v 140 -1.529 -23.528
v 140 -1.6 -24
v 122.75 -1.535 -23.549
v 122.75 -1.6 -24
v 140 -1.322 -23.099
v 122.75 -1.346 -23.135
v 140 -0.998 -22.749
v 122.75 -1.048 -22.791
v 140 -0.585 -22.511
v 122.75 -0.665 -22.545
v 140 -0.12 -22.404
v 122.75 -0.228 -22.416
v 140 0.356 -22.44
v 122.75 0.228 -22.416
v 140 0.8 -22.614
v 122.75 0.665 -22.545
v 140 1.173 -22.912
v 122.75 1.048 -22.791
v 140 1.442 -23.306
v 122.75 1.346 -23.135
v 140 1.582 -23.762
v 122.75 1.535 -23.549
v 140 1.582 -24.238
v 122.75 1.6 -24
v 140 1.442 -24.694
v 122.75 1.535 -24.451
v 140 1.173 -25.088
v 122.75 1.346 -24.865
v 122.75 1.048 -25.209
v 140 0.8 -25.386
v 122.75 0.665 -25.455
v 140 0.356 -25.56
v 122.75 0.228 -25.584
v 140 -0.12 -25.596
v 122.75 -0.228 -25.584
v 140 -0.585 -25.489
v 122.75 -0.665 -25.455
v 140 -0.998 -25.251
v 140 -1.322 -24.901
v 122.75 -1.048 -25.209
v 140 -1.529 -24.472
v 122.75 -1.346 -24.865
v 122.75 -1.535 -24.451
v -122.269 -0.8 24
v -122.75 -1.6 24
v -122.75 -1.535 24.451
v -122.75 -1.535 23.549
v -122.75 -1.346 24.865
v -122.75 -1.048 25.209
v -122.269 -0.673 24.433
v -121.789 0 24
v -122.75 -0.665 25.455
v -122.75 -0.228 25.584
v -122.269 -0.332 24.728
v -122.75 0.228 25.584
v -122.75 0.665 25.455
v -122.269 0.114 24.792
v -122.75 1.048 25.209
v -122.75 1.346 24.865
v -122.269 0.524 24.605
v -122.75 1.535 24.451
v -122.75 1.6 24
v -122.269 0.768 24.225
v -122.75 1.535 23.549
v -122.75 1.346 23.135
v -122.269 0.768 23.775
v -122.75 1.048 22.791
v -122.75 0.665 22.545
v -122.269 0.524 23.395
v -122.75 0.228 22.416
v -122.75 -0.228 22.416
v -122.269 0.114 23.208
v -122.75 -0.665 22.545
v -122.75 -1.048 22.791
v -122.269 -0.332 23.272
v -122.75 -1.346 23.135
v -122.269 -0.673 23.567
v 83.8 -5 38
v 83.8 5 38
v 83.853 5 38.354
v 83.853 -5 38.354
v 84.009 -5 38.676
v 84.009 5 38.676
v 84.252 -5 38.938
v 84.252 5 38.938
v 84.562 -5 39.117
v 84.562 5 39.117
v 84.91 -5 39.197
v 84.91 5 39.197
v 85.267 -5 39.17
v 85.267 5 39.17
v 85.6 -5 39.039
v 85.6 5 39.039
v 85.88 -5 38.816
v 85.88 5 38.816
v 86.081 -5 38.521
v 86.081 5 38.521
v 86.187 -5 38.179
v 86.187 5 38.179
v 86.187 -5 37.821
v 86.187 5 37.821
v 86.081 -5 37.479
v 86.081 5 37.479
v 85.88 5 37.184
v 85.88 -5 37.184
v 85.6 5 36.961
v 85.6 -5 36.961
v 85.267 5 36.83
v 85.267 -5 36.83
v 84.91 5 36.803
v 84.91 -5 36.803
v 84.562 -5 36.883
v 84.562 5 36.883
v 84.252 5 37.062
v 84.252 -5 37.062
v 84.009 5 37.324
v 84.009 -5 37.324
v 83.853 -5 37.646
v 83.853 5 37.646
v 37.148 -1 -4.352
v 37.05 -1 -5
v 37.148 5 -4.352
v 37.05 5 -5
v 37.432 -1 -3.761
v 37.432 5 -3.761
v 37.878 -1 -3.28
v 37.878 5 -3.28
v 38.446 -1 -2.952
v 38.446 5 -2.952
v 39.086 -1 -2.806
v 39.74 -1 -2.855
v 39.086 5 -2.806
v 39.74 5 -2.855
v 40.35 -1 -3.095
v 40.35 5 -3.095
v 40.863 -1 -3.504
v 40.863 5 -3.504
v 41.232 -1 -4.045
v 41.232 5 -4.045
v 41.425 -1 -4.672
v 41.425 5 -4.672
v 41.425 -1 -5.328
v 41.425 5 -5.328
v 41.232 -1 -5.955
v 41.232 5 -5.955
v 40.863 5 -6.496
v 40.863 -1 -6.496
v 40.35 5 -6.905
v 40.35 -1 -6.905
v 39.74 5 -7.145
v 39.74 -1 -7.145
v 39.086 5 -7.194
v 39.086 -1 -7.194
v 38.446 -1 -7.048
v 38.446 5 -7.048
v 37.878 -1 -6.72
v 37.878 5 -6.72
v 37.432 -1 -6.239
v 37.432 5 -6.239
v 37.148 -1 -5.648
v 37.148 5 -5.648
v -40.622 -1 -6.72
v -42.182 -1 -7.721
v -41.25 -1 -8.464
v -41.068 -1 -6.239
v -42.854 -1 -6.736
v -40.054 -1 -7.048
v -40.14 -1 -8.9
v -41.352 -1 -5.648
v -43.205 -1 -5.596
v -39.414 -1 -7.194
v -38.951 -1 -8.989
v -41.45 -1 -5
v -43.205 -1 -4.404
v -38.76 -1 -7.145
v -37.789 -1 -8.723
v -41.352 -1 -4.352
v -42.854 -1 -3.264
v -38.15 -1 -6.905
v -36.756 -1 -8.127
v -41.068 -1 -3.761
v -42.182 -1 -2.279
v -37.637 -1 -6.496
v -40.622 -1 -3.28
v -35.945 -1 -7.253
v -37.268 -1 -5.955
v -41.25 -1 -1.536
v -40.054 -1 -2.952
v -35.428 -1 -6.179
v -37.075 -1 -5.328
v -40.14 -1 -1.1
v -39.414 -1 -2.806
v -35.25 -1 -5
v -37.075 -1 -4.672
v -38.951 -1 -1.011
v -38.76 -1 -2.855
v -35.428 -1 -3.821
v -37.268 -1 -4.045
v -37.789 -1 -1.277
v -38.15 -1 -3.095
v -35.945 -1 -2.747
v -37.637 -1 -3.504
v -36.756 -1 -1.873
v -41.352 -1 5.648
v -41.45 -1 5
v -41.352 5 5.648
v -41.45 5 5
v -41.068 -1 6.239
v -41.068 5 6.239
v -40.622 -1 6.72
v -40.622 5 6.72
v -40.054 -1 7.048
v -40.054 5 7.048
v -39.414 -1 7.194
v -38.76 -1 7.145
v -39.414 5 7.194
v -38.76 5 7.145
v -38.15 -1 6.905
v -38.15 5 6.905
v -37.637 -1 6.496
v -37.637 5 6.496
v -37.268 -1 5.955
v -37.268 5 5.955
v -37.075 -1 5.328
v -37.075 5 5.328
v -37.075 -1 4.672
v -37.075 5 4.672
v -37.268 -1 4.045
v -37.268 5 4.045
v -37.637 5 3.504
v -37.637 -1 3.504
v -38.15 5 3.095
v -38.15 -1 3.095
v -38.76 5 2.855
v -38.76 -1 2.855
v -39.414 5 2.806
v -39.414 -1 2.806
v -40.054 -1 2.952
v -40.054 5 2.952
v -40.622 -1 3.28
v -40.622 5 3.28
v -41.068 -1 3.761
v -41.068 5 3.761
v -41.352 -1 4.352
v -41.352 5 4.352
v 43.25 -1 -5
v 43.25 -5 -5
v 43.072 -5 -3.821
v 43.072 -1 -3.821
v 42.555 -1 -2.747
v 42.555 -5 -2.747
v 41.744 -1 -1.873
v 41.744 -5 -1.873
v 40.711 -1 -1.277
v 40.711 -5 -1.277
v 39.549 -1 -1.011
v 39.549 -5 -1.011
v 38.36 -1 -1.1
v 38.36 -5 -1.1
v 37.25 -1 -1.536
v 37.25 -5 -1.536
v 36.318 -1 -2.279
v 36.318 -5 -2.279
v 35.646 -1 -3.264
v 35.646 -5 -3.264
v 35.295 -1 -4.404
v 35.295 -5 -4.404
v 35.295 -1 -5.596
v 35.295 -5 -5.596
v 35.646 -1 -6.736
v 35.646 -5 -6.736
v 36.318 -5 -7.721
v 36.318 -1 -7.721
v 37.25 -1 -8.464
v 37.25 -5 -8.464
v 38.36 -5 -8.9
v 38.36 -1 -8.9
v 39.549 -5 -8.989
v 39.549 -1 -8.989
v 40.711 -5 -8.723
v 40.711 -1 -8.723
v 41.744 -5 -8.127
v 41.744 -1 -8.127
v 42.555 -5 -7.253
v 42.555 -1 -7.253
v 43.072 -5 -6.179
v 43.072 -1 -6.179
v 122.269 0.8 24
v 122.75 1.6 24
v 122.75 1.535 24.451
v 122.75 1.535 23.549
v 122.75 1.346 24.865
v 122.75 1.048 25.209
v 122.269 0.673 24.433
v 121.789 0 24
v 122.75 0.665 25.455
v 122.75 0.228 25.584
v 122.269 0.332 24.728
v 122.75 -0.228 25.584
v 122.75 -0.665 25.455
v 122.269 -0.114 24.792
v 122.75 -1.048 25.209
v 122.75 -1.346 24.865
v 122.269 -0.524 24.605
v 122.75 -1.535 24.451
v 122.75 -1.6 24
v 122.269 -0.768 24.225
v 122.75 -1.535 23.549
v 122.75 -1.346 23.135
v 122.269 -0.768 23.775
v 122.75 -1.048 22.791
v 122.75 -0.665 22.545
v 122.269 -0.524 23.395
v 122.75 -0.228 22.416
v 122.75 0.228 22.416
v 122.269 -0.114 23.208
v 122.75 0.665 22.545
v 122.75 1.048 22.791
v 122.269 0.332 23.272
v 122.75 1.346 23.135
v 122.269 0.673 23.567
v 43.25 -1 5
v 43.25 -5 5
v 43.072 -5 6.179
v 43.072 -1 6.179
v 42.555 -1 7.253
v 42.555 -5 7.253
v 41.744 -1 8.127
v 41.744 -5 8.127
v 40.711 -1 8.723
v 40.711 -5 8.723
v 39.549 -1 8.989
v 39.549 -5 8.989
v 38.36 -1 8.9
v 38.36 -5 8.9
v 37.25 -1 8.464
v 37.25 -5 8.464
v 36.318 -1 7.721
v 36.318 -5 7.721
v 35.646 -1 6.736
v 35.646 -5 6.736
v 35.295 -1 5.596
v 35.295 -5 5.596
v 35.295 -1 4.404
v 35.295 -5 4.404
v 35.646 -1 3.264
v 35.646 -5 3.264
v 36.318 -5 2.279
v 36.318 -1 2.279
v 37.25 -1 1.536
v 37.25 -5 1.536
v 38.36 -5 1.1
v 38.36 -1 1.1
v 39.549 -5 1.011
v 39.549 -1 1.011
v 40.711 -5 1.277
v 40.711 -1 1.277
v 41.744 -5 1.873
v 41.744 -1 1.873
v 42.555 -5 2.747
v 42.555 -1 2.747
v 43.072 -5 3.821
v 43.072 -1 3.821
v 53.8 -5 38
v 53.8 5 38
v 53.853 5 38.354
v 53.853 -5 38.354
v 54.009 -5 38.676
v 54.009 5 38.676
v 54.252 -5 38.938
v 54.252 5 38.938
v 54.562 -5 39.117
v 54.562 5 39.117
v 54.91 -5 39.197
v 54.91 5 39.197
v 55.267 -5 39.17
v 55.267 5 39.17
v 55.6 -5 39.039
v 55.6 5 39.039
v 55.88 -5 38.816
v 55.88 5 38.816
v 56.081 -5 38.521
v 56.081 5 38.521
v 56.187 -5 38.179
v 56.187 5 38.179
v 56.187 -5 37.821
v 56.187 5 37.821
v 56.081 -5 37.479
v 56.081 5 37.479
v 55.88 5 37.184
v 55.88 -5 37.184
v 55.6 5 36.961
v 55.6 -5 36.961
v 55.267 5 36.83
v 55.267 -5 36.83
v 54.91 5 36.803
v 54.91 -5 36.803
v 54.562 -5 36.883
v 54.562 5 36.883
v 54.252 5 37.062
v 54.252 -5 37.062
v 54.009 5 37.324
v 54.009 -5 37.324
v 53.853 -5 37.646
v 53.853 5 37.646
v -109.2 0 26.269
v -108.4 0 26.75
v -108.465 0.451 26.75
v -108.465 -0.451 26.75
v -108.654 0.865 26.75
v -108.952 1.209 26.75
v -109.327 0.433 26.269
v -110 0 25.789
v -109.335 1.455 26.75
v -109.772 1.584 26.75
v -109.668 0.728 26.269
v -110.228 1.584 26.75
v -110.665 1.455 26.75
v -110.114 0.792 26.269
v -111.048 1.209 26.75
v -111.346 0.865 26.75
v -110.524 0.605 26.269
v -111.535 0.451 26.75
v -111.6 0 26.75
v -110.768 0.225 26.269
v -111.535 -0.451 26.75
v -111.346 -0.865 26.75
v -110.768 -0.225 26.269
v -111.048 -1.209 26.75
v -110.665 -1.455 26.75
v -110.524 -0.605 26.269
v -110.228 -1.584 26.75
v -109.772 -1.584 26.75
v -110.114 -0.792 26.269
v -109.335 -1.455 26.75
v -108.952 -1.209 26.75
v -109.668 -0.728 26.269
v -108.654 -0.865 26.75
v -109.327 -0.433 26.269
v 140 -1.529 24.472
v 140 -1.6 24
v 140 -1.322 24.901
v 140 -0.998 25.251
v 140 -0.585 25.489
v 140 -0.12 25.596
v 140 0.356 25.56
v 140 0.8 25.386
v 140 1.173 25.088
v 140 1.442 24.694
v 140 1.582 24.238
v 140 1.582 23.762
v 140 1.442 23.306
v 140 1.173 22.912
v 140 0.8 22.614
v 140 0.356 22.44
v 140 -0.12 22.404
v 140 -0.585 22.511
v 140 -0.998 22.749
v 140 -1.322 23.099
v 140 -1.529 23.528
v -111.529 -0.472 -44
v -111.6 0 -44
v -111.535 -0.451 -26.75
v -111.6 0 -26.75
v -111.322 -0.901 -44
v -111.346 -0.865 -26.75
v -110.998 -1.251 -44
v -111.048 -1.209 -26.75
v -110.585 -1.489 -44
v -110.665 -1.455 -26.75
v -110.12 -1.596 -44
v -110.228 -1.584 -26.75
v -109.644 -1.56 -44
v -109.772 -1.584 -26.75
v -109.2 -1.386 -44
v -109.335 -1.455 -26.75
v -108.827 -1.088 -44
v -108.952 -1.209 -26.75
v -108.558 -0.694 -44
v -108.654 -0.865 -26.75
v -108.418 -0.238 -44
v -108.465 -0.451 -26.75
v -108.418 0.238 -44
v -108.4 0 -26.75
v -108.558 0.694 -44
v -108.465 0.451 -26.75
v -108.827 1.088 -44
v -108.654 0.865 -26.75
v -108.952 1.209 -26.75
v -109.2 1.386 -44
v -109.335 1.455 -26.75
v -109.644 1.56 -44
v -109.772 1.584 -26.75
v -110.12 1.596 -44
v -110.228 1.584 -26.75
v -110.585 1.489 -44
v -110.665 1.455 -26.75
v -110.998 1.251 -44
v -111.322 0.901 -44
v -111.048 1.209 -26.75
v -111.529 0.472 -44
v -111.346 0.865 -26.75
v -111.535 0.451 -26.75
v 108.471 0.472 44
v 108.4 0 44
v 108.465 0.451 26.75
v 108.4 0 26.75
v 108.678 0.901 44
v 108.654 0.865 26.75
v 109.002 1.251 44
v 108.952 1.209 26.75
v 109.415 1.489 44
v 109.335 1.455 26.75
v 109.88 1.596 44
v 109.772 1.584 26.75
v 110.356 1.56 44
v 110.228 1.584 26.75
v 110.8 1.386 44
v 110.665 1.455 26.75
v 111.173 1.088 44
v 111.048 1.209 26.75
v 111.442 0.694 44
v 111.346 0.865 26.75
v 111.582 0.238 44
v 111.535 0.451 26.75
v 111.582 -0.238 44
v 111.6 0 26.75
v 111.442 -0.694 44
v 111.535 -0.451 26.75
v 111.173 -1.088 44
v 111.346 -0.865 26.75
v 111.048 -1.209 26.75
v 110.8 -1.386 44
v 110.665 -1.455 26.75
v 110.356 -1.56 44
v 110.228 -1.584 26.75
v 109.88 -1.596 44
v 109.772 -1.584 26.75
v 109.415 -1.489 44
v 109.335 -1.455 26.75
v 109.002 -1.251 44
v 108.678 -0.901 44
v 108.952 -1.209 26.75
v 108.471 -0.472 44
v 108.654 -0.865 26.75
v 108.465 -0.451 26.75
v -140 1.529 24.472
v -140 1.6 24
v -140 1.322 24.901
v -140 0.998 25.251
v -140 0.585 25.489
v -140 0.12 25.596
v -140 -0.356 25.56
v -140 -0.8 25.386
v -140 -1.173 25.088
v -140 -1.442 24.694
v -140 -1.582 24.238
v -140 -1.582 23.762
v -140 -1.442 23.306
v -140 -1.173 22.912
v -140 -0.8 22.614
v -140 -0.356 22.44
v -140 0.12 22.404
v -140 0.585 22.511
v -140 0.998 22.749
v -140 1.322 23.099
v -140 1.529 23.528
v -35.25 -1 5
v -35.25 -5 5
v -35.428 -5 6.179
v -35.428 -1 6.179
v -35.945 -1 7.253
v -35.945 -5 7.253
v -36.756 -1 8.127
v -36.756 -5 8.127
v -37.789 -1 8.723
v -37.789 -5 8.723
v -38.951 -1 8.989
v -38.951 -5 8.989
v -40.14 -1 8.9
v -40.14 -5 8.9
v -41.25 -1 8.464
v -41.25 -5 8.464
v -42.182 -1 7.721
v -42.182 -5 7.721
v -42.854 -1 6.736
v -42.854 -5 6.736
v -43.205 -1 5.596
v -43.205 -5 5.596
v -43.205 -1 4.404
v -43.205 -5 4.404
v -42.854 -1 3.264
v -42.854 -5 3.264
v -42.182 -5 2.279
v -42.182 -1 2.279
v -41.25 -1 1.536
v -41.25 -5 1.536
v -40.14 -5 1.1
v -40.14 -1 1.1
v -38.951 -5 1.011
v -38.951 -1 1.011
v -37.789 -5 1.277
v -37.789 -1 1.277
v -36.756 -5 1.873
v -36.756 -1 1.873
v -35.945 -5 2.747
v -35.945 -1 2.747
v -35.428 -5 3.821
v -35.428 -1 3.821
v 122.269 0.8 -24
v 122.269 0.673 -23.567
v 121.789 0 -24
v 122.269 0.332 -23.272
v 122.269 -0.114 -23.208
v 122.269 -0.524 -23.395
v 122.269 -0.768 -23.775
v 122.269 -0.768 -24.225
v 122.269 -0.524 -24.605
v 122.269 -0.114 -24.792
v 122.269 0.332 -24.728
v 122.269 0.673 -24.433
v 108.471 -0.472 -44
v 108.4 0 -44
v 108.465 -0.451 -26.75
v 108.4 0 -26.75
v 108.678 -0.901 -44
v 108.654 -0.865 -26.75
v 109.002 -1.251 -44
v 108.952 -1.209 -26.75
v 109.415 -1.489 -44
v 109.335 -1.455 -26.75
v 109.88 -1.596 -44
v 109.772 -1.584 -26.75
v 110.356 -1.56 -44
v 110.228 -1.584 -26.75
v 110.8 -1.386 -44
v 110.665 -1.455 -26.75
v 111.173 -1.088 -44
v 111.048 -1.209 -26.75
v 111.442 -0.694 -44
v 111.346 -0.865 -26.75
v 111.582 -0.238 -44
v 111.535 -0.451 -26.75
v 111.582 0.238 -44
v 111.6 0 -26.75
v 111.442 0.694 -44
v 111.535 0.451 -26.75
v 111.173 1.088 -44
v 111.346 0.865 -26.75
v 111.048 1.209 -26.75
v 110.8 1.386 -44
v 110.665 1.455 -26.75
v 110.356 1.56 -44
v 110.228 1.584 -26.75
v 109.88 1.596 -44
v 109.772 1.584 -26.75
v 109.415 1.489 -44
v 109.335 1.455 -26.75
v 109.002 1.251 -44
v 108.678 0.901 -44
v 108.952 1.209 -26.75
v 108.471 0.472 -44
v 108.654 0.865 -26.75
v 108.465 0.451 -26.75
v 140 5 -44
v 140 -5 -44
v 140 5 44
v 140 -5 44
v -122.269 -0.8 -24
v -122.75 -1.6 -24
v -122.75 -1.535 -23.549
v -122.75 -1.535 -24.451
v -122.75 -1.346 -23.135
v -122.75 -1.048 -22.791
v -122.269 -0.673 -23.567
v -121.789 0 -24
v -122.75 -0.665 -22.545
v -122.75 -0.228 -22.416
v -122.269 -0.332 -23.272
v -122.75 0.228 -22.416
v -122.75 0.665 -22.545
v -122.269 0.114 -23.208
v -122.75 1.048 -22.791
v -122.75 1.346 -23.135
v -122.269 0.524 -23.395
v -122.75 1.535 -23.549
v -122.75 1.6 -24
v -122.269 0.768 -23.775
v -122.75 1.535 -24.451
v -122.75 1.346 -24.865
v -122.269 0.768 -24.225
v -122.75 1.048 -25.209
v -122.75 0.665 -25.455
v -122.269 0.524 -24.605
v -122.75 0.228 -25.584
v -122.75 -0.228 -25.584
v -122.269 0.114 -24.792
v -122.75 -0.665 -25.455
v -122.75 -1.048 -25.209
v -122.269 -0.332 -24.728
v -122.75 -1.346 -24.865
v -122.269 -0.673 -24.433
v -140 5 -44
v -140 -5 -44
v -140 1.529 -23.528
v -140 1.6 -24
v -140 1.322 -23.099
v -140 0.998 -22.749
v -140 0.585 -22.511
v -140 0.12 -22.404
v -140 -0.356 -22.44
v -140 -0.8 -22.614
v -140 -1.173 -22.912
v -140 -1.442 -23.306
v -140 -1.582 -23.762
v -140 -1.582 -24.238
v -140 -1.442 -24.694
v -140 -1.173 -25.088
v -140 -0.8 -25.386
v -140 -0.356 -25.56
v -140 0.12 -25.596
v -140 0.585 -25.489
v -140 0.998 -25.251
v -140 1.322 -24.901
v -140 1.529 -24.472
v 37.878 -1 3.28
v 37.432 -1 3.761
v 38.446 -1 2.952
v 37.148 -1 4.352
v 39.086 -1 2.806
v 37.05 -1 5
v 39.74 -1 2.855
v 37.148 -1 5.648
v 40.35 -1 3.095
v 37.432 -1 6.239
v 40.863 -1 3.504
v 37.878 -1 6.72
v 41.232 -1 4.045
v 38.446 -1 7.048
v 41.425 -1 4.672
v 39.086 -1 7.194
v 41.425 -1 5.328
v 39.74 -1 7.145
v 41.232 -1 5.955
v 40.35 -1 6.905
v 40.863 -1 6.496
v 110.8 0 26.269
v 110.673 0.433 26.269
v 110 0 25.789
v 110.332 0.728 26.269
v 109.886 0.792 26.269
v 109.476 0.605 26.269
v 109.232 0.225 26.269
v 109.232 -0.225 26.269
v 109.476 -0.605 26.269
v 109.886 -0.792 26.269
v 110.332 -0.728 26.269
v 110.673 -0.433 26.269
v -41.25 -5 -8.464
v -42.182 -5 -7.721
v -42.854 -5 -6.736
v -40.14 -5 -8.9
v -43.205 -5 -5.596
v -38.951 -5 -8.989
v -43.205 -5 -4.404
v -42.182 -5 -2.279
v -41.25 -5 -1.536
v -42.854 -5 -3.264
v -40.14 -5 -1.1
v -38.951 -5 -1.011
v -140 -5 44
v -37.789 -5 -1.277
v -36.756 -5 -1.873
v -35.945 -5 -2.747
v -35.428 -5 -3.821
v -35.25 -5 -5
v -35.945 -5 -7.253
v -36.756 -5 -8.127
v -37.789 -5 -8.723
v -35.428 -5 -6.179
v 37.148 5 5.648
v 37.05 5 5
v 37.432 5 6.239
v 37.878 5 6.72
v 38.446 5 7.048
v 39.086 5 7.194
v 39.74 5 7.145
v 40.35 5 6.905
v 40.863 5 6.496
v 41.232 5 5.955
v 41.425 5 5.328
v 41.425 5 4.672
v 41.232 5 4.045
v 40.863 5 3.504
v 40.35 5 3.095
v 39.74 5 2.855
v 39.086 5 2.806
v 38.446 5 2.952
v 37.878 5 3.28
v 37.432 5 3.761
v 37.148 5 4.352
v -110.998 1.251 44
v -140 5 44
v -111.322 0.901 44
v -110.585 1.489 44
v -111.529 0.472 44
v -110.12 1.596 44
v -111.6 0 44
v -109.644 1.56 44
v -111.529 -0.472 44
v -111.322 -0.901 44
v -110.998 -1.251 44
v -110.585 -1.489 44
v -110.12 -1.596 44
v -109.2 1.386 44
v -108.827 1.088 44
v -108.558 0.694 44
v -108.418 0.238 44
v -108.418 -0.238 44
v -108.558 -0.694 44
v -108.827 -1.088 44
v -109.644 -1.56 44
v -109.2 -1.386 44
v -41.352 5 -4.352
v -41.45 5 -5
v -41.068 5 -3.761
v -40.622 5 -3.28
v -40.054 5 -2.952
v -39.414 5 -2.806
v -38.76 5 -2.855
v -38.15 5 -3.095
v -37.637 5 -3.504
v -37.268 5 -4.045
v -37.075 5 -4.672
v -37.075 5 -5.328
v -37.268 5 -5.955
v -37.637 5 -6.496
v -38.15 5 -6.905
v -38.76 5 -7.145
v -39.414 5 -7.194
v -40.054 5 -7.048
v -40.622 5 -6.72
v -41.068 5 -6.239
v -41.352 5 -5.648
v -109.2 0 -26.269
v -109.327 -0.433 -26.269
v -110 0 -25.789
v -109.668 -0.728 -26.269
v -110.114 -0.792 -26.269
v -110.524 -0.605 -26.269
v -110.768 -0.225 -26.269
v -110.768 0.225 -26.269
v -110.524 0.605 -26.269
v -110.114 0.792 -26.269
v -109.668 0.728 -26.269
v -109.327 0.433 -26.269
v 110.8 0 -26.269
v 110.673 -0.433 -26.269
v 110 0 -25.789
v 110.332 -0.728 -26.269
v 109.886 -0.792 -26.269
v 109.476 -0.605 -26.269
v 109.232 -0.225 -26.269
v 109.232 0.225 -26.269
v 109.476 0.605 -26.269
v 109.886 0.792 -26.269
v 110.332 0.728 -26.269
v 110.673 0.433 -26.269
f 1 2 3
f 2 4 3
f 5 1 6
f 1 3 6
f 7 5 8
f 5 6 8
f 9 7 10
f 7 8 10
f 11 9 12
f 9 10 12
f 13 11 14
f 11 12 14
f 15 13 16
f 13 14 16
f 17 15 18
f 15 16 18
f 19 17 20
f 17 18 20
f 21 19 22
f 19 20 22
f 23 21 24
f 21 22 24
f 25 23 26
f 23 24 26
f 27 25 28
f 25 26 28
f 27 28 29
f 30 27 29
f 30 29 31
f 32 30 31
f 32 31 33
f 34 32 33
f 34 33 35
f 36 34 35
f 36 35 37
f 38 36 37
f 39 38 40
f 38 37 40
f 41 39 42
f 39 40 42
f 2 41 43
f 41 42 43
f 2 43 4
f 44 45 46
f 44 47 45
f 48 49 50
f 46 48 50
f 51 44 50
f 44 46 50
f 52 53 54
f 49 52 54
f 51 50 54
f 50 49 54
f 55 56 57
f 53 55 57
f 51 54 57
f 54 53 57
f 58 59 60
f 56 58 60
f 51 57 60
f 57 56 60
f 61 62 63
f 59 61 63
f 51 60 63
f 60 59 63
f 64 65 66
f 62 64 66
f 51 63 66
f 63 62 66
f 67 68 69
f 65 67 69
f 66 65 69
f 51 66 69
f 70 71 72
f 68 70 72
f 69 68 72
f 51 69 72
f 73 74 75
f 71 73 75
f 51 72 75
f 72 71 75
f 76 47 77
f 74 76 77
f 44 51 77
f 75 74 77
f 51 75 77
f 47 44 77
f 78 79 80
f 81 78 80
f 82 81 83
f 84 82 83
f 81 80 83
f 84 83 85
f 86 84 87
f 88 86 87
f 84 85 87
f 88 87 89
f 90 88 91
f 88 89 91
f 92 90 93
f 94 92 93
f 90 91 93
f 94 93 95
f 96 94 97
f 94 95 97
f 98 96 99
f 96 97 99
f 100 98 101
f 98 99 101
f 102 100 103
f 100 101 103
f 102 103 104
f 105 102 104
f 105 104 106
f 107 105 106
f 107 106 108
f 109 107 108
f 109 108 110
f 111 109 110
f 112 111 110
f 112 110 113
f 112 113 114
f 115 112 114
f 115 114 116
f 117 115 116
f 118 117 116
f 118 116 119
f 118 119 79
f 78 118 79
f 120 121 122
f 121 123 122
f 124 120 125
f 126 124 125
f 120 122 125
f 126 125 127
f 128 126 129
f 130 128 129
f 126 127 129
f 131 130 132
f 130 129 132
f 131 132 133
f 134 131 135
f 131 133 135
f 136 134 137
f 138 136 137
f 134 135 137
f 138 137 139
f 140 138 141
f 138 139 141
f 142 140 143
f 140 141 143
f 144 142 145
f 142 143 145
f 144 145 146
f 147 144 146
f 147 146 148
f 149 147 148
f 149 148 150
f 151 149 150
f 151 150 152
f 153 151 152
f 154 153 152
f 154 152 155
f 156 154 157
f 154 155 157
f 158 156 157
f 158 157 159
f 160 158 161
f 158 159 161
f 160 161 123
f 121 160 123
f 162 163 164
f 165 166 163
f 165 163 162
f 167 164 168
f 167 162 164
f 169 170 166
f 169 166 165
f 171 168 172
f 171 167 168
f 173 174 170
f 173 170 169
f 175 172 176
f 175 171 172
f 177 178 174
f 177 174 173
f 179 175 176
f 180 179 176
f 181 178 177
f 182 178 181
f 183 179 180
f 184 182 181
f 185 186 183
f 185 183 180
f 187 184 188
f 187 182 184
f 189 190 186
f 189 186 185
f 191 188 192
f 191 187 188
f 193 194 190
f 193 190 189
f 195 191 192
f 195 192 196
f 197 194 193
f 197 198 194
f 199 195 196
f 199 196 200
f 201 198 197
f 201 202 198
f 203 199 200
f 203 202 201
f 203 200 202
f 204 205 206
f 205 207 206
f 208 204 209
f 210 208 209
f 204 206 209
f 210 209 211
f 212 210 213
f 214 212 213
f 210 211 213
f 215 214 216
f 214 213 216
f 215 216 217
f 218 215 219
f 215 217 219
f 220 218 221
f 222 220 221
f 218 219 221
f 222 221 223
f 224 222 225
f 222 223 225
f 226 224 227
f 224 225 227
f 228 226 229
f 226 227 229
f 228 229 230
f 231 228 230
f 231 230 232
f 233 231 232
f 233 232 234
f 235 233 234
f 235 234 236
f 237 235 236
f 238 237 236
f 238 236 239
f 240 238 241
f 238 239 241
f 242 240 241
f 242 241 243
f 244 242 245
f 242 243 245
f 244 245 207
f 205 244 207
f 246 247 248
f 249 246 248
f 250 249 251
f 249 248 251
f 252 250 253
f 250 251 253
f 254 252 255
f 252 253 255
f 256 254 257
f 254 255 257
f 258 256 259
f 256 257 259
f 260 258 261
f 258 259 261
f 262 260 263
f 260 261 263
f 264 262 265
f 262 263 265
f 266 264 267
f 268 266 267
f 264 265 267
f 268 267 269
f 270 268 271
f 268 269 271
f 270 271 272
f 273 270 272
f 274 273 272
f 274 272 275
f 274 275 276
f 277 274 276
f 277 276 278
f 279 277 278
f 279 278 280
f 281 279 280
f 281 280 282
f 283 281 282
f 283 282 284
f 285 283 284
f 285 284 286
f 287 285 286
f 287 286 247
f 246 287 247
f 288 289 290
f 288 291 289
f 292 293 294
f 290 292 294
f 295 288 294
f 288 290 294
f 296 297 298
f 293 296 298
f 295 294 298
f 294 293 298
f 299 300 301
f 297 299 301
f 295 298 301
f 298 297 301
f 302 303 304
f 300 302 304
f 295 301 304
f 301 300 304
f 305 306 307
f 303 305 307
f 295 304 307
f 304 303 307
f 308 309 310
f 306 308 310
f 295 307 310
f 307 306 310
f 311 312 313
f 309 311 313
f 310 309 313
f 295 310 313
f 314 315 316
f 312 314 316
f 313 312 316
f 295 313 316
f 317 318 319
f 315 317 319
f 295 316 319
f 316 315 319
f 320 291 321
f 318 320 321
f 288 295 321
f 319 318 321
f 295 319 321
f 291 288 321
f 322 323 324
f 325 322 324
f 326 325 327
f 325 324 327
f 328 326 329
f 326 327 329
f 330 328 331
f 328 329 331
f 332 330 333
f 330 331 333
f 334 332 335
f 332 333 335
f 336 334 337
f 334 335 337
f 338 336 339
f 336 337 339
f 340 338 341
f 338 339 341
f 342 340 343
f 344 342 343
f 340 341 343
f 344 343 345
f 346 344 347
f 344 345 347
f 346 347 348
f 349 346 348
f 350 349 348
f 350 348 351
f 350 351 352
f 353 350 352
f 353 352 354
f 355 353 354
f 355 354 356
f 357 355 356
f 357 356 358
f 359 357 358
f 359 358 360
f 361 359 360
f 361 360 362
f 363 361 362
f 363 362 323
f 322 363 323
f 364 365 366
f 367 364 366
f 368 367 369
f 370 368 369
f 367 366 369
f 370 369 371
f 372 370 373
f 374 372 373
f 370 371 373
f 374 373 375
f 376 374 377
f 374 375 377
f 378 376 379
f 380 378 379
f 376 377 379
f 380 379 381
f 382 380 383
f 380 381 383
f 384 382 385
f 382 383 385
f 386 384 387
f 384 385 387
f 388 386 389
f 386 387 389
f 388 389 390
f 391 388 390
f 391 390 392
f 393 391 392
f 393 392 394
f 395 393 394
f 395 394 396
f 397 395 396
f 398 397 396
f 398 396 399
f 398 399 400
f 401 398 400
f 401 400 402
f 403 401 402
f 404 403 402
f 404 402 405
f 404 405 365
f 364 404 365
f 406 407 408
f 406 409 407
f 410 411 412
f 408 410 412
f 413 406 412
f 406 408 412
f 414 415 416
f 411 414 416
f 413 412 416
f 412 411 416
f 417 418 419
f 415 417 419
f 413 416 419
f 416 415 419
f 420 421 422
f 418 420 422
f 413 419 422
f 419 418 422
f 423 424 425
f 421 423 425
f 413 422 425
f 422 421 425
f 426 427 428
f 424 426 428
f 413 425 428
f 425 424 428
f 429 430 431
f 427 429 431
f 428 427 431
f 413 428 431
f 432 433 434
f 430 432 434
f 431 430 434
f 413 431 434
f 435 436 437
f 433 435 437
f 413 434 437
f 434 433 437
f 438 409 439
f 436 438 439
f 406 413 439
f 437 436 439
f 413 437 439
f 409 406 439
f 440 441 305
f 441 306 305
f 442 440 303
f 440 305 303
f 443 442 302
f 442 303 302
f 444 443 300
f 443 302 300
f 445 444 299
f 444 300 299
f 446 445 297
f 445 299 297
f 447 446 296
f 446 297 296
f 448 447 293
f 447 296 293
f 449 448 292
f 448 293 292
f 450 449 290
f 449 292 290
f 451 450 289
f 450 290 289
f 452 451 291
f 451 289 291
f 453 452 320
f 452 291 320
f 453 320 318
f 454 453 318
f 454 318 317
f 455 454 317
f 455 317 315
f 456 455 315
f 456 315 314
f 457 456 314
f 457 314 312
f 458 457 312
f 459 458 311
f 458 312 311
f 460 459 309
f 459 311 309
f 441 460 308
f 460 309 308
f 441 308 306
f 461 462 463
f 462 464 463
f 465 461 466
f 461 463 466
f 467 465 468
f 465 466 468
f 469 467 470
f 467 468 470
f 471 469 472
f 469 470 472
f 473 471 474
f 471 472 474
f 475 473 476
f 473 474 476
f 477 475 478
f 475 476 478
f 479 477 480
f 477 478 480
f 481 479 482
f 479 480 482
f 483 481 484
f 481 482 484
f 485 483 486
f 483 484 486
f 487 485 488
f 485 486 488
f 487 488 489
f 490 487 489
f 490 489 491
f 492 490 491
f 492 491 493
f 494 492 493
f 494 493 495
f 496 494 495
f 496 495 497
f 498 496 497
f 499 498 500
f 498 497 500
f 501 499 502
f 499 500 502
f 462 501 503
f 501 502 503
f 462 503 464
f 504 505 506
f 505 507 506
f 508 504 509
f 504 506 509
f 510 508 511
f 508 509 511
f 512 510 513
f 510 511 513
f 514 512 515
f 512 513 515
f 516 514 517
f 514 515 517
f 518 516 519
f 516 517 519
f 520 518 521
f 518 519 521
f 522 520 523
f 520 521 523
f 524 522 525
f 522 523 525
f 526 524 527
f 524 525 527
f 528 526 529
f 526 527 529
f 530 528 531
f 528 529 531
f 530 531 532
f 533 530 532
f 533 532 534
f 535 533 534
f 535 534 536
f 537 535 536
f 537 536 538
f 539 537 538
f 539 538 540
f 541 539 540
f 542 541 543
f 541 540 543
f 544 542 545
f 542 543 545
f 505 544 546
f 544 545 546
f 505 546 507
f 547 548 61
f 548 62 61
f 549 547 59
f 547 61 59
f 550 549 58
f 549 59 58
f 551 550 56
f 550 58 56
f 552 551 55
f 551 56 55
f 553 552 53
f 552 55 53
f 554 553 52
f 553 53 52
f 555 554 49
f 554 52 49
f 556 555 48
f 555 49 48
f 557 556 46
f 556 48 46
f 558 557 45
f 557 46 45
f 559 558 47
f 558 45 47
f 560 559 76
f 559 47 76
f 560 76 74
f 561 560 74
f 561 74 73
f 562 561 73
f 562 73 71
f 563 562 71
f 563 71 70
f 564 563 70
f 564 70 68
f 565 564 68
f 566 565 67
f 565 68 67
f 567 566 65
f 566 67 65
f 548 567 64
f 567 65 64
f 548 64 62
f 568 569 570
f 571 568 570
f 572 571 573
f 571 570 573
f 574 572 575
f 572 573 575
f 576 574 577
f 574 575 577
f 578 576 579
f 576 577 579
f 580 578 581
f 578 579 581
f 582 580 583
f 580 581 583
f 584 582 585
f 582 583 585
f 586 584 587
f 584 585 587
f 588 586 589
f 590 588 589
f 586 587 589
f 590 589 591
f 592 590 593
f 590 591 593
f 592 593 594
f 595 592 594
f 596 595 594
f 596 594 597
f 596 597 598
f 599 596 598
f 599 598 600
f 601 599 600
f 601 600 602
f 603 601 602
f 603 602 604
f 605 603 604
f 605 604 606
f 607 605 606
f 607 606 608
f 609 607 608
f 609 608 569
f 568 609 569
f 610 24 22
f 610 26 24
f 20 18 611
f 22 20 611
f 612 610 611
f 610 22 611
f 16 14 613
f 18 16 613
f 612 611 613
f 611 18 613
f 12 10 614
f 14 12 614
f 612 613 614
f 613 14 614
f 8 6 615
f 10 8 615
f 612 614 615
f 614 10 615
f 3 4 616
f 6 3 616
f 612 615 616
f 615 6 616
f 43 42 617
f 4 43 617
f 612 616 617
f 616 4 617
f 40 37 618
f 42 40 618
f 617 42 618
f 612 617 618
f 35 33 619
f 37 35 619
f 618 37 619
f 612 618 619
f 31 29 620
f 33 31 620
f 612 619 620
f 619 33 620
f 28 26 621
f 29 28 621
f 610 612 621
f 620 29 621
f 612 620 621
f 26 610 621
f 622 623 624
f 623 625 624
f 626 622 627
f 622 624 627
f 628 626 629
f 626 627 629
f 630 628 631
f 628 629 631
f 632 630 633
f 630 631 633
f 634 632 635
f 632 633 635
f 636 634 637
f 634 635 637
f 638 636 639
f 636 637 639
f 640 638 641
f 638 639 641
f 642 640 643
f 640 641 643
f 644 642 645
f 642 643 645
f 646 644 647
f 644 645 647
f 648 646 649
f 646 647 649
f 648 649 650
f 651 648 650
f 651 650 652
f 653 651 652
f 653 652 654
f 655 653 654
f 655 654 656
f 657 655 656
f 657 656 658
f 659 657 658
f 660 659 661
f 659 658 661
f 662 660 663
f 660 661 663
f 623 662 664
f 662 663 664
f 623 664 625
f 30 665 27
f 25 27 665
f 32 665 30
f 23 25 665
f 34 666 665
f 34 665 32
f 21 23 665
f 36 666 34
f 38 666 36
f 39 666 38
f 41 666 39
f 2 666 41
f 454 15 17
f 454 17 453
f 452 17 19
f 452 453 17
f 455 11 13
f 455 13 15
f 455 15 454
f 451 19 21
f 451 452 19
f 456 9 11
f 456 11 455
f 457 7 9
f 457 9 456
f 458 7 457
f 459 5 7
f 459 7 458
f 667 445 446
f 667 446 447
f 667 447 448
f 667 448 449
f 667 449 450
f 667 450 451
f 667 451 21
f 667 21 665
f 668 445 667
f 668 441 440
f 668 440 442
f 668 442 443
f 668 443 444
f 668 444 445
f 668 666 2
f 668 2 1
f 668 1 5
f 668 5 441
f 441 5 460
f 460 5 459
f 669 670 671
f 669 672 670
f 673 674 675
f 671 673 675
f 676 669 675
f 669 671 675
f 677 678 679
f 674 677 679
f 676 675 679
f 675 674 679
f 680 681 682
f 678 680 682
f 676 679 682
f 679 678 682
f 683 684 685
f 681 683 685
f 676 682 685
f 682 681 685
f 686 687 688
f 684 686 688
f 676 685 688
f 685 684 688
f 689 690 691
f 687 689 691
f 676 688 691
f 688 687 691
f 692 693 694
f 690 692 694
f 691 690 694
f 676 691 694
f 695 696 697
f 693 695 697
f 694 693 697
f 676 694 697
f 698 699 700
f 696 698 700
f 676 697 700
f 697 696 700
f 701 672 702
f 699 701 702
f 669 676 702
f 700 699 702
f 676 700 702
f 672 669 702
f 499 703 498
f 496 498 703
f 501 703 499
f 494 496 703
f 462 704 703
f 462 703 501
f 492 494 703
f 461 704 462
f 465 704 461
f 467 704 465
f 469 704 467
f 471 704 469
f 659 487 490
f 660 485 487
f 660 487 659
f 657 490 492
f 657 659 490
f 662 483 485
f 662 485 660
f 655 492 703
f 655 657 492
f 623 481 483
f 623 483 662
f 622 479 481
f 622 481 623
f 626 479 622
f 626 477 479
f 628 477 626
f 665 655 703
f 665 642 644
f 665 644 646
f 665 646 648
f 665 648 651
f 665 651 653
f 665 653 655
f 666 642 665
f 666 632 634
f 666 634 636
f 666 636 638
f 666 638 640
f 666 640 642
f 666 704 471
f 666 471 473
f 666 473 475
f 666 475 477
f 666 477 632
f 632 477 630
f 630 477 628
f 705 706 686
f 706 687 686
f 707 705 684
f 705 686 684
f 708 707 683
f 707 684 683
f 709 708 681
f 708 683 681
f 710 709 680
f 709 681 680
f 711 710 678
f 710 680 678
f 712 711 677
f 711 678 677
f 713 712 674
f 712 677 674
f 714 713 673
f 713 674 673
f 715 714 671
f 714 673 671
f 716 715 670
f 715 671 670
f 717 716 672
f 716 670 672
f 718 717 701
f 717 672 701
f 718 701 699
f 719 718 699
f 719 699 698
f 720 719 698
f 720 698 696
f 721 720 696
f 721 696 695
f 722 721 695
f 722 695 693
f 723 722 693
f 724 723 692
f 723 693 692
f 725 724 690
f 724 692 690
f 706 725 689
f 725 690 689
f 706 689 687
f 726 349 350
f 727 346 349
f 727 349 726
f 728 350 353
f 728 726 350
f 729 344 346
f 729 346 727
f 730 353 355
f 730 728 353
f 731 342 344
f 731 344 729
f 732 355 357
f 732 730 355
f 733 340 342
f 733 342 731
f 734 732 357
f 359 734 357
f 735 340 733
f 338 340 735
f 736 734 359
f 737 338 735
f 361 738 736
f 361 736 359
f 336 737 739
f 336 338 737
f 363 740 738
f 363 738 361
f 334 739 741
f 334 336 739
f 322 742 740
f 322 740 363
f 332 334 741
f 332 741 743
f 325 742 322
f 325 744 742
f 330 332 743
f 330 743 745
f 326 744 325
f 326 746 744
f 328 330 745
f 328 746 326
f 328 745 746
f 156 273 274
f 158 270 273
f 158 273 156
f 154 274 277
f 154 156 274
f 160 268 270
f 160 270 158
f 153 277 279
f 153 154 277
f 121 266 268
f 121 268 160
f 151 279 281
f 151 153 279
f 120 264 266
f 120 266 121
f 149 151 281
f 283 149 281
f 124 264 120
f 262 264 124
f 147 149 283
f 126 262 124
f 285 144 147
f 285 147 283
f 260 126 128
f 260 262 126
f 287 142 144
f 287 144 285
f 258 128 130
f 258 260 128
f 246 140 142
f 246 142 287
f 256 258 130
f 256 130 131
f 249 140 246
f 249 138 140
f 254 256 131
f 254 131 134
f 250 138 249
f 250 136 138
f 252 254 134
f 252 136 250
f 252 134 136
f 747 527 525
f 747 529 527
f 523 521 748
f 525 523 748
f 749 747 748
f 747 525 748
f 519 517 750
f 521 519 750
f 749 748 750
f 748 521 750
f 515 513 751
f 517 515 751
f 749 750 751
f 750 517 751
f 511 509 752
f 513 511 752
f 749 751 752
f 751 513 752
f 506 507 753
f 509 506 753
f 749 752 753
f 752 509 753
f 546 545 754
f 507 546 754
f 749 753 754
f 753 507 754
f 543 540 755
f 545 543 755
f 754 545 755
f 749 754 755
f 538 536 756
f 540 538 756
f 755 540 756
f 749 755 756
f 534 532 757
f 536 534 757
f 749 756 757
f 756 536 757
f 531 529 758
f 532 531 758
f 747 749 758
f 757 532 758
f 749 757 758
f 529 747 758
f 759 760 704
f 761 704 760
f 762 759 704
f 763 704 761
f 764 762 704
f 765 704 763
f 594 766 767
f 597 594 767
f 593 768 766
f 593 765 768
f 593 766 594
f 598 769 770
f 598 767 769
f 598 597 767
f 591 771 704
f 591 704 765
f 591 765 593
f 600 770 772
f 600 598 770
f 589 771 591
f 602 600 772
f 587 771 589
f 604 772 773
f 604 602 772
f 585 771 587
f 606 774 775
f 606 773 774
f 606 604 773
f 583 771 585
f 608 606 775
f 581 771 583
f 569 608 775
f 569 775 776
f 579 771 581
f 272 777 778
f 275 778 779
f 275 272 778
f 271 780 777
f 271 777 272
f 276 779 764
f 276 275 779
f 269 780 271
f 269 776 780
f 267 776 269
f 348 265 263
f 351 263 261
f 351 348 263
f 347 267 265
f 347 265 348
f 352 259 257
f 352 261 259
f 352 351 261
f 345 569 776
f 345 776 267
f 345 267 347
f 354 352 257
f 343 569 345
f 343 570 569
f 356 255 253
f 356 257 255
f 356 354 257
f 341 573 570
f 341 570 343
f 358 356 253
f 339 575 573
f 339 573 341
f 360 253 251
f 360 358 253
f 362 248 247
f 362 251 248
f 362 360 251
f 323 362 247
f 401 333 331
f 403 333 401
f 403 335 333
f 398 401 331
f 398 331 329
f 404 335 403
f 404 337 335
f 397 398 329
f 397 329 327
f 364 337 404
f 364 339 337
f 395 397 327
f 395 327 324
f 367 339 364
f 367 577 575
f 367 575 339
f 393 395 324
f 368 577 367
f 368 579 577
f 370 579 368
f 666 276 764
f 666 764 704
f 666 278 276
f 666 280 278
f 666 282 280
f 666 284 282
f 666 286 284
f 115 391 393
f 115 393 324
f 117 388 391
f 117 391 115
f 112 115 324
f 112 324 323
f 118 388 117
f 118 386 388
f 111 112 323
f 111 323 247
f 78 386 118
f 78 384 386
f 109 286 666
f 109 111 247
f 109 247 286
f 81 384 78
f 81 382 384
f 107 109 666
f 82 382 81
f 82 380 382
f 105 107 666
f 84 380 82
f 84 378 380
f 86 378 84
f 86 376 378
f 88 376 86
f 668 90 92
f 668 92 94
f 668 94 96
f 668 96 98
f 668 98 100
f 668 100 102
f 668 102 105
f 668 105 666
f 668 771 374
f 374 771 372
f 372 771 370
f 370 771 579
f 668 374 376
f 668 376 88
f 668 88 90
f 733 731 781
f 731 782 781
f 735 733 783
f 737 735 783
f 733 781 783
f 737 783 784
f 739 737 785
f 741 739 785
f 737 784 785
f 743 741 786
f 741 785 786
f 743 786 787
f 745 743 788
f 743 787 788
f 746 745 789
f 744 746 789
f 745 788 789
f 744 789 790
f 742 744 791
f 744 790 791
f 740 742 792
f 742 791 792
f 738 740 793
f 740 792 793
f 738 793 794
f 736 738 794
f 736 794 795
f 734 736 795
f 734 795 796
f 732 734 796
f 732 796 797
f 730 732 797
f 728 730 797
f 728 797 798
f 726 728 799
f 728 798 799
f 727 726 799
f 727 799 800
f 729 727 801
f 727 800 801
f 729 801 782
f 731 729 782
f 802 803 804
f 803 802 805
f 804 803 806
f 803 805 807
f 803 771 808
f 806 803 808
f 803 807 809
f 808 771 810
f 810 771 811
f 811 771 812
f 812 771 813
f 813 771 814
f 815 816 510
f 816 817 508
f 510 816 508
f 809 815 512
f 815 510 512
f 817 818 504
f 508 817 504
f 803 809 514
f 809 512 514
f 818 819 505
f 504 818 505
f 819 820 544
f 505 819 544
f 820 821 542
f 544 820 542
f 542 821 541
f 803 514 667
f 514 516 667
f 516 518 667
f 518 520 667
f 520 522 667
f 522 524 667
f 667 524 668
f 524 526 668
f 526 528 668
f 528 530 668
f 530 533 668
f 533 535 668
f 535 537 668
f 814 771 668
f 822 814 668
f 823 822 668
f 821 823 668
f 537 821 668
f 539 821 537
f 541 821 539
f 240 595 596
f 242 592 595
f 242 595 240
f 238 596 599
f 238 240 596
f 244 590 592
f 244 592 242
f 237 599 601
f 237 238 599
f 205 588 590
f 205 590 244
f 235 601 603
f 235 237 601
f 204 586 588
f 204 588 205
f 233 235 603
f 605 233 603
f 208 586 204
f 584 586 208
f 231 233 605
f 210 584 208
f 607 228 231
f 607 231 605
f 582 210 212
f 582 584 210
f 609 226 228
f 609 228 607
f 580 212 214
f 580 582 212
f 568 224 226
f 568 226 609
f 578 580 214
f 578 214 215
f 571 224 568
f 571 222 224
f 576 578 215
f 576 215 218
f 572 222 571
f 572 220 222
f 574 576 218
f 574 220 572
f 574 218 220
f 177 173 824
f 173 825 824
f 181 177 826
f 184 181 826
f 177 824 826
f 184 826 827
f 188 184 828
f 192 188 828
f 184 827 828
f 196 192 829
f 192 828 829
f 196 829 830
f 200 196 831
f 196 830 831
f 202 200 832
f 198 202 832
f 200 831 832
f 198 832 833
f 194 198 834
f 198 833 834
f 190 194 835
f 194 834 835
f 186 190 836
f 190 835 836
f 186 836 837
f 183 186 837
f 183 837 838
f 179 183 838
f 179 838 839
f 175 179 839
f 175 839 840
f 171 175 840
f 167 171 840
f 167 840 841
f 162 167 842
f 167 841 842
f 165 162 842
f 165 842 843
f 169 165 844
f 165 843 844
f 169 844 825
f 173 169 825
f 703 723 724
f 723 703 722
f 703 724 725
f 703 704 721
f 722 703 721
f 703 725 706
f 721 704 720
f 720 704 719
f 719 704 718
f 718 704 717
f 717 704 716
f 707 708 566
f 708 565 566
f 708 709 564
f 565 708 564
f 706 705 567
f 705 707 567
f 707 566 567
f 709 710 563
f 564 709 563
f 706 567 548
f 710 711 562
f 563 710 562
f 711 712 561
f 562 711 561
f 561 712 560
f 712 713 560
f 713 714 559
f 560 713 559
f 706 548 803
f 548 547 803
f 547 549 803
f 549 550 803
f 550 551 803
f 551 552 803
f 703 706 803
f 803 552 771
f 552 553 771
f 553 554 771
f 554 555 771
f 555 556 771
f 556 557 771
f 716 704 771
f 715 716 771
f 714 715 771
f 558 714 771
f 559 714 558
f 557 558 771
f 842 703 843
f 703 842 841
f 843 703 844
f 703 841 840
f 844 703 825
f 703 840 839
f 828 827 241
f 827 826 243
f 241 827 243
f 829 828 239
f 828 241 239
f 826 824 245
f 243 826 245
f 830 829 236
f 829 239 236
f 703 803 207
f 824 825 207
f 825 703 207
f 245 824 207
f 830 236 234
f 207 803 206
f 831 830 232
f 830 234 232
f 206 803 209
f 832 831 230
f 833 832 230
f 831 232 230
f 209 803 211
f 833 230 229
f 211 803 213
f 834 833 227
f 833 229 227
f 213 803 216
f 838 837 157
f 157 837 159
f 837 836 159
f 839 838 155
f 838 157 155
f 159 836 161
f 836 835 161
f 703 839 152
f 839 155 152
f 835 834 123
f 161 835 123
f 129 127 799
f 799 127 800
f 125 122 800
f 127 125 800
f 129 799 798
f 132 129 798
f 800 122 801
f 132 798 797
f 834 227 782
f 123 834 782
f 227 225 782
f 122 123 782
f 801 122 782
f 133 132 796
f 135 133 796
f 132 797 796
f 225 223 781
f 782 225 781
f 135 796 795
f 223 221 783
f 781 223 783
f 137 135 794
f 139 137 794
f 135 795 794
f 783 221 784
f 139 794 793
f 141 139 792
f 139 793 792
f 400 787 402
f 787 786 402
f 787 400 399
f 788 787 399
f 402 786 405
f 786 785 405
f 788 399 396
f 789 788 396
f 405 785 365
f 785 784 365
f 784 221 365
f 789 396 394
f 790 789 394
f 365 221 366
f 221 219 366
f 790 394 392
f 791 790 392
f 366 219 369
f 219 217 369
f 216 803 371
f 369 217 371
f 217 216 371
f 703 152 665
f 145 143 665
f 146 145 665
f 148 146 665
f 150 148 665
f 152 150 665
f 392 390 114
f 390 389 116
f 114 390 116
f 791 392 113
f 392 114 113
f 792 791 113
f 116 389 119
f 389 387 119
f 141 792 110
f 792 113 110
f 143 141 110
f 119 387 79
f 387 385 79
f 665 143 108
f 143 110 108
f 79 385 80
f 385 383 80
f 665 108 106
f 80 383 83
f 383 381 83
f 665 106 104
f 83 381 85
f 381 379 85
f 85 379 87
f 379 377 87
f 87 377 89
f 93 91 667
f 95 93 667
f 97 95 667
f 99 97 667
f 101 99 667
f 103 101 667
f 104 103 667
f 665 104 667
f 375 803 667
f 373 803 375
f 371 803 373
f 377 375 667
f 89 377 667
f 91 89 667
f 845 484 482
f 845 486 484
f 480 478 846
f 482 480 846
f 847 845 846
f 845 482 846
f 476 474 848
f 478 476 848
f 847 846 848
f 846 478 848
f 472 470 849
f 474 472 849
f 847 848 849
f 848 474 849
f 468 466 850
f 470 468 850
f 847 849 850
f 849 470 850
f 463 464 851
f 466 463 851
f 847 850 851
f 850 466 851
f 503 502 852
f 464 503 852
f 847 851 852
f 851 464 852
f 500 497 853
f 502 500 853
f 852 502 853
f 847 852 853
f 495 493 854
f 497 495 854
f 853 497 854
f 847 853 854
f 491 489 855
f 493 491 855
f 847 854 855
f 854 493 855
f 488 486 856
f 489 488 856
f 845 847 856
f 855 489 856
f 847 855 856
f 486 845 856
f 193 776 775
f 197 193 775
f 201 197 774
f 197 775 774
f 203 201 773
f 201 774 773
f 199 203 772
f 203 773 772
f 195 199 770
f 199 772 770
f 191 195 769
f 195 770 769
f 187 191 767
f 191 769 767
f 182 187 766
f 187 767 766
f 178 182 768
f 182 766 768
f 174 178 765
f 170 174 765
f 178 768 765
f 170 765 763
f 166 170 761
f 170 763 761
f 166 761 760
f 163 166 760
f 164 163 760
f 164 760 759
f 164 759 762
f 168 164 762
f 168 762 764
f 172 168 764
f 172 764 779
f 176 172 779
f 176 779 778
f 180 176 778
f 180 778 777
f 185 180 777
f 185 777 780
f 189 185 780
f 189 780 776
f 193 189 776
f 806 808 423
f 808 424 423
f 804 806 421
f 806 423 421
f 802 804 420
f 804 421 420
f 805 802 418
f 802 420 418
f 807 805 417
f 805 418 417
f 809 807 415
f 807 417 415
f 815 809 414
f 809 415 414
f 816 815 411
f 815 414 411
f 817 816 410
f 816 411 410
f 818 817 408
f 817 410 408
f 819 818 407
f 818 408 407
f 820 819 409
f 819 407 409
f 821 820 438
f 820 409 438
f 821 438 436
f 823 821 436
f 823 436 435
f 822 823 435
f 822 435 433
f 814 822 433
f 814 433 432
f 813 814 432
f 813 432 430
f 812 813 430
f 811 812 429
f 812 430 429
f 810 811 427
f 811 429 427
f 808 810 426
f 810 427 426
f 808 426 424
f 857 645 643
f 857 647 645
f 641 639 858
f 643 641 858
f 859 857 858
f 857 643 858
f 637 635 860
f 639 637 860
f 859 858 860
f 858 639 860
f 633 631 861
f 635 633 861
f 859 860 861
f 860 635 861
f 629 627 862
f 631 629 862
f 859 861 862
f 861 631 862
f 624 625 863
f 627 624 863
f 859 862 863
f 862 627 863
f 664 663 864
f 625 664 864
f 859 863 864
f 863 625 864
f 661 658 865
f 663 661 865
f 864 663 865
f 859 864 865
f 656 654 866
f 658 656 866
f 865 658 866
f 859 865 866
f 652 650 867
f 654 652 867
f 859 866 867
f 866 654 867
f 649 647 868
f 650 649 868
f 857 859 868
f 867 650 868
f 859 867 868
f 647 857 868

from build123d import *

# Parameters (mm, degrees)
F0_W           = 280
F0_H           = 88
F1_DEPTH       = 5
F6_D           = 3.2
F6_DEPTH       = 17.25
F6_TIP         = 0.9613769904
F6_ON_F5_D     = 3.2
F6_ON_F5_DEPTH = 17.25
F6_ON_F5_TIP   = 0.9613769904
F6_ON_F3_D     = 3.2
F6_ON_F3_DEPTH = 17.25
F6_ON_F3_TIP   = 0.9613769904
F6_ON_F2_D     = 3.2
F6_ON_F2_DEPTH = 17.25
F6_ON_F2_TIP   = 0.9613769904
F8_D           = 4.4
F8_CBORE_D     = 8
F8_CBORE_DEPTH = 4
F10_D          = 2.4


with BuildPart() as f1:
    # F0 (on Front) → F1 (new body, symmetric)
    with BuildSketch(Plane.XZ):
        Rectangle(F0_W, F0_H)
    extrude(amount=F1_DEPTH, both=True)

    # F6
    with Locations(Plane.XY.offset(44)):
        with Locations((110, 0), (-110, 0)):
            Hole(F6_D / 2, depth=F6_DEPTH)
            with Locations((0, 0, -(F6_DEPTH + F6_TIP / 2))):  # 118° drill point
                Cone(0, F6_D / 2, F6_TIP, mode=Mode.SUBTRACT)

    # F6 on F5
    with Locations(Plane(origin=(0, 0, -44), x_dir=(1, 0, 0), z_dir=(0, 0, -1))):
        with Locations((-110, 0), (110, 0)):
            Hole(F6_ON_F5_D / 2, depth=F6_ON_F5_DEPTH)
            with Locations((0, 0, -(F6_ON_F5_DEPTH + F6_ON_F5_TIP / 2))):  # 118° drill point
                Cone(0, F6_ON_F5_D / 2, F6_ON_F5_TIP, mode=Mode.SUBTRACT)

    # F6 on F3
    with Locations(Plane.YZ.offset(140)):
        with Locations((0, -24), (0, 24)):
            Hole(F6_ON_F3_D / 2, depth=F6_ON_F3_DEPTH)
            with Locations((0, 0, -(F6_ON_F3_DEPTH + F6_ON_F3_TIP / 2))):  # 118° drill point
                Cone(0, F6_ON_F3_D / 2, F6_ON_F3_TIP, mode=Mode.SUBTRACT)

    # F6 on F2
    with Locations(Plane(origin=(-140, 0, 0), x_dir=(0, -1, 0), z_dir=(-1, 0, 0))):
        with Locations((0, -24), (0, 24)):
            Hole(F6_ON_F2_D / 2, depth=F6_ON_F2_DEPTH)
            with Locations((0, 0, -(F6_ON_F2_DEPTH + F6_ON_F2_TIP / 2))):  # 118° drill point
                Cone(0, F6_ON_F2_D / 2, F6_ON_F2_TIP, mode=Mode.SUBTRACT)

    # F8 (through all)
    with Locations(Plane.XZ.offset(5)):
        with Locations((-39.25, 5), (39.25, 5), (-39.25, -5), (39.25, -5)):
            CounterBoreHole(F8_D / 2, F8_CBORE_D / 2, F8_CBORE_DEPTH)

    # F10 (through all)
    with Locations(Plane.XZ.offset(5)):
        with Locations((85, 38), (55, 38)):
            Hole(F10_D / 2)


solid = f1.part
